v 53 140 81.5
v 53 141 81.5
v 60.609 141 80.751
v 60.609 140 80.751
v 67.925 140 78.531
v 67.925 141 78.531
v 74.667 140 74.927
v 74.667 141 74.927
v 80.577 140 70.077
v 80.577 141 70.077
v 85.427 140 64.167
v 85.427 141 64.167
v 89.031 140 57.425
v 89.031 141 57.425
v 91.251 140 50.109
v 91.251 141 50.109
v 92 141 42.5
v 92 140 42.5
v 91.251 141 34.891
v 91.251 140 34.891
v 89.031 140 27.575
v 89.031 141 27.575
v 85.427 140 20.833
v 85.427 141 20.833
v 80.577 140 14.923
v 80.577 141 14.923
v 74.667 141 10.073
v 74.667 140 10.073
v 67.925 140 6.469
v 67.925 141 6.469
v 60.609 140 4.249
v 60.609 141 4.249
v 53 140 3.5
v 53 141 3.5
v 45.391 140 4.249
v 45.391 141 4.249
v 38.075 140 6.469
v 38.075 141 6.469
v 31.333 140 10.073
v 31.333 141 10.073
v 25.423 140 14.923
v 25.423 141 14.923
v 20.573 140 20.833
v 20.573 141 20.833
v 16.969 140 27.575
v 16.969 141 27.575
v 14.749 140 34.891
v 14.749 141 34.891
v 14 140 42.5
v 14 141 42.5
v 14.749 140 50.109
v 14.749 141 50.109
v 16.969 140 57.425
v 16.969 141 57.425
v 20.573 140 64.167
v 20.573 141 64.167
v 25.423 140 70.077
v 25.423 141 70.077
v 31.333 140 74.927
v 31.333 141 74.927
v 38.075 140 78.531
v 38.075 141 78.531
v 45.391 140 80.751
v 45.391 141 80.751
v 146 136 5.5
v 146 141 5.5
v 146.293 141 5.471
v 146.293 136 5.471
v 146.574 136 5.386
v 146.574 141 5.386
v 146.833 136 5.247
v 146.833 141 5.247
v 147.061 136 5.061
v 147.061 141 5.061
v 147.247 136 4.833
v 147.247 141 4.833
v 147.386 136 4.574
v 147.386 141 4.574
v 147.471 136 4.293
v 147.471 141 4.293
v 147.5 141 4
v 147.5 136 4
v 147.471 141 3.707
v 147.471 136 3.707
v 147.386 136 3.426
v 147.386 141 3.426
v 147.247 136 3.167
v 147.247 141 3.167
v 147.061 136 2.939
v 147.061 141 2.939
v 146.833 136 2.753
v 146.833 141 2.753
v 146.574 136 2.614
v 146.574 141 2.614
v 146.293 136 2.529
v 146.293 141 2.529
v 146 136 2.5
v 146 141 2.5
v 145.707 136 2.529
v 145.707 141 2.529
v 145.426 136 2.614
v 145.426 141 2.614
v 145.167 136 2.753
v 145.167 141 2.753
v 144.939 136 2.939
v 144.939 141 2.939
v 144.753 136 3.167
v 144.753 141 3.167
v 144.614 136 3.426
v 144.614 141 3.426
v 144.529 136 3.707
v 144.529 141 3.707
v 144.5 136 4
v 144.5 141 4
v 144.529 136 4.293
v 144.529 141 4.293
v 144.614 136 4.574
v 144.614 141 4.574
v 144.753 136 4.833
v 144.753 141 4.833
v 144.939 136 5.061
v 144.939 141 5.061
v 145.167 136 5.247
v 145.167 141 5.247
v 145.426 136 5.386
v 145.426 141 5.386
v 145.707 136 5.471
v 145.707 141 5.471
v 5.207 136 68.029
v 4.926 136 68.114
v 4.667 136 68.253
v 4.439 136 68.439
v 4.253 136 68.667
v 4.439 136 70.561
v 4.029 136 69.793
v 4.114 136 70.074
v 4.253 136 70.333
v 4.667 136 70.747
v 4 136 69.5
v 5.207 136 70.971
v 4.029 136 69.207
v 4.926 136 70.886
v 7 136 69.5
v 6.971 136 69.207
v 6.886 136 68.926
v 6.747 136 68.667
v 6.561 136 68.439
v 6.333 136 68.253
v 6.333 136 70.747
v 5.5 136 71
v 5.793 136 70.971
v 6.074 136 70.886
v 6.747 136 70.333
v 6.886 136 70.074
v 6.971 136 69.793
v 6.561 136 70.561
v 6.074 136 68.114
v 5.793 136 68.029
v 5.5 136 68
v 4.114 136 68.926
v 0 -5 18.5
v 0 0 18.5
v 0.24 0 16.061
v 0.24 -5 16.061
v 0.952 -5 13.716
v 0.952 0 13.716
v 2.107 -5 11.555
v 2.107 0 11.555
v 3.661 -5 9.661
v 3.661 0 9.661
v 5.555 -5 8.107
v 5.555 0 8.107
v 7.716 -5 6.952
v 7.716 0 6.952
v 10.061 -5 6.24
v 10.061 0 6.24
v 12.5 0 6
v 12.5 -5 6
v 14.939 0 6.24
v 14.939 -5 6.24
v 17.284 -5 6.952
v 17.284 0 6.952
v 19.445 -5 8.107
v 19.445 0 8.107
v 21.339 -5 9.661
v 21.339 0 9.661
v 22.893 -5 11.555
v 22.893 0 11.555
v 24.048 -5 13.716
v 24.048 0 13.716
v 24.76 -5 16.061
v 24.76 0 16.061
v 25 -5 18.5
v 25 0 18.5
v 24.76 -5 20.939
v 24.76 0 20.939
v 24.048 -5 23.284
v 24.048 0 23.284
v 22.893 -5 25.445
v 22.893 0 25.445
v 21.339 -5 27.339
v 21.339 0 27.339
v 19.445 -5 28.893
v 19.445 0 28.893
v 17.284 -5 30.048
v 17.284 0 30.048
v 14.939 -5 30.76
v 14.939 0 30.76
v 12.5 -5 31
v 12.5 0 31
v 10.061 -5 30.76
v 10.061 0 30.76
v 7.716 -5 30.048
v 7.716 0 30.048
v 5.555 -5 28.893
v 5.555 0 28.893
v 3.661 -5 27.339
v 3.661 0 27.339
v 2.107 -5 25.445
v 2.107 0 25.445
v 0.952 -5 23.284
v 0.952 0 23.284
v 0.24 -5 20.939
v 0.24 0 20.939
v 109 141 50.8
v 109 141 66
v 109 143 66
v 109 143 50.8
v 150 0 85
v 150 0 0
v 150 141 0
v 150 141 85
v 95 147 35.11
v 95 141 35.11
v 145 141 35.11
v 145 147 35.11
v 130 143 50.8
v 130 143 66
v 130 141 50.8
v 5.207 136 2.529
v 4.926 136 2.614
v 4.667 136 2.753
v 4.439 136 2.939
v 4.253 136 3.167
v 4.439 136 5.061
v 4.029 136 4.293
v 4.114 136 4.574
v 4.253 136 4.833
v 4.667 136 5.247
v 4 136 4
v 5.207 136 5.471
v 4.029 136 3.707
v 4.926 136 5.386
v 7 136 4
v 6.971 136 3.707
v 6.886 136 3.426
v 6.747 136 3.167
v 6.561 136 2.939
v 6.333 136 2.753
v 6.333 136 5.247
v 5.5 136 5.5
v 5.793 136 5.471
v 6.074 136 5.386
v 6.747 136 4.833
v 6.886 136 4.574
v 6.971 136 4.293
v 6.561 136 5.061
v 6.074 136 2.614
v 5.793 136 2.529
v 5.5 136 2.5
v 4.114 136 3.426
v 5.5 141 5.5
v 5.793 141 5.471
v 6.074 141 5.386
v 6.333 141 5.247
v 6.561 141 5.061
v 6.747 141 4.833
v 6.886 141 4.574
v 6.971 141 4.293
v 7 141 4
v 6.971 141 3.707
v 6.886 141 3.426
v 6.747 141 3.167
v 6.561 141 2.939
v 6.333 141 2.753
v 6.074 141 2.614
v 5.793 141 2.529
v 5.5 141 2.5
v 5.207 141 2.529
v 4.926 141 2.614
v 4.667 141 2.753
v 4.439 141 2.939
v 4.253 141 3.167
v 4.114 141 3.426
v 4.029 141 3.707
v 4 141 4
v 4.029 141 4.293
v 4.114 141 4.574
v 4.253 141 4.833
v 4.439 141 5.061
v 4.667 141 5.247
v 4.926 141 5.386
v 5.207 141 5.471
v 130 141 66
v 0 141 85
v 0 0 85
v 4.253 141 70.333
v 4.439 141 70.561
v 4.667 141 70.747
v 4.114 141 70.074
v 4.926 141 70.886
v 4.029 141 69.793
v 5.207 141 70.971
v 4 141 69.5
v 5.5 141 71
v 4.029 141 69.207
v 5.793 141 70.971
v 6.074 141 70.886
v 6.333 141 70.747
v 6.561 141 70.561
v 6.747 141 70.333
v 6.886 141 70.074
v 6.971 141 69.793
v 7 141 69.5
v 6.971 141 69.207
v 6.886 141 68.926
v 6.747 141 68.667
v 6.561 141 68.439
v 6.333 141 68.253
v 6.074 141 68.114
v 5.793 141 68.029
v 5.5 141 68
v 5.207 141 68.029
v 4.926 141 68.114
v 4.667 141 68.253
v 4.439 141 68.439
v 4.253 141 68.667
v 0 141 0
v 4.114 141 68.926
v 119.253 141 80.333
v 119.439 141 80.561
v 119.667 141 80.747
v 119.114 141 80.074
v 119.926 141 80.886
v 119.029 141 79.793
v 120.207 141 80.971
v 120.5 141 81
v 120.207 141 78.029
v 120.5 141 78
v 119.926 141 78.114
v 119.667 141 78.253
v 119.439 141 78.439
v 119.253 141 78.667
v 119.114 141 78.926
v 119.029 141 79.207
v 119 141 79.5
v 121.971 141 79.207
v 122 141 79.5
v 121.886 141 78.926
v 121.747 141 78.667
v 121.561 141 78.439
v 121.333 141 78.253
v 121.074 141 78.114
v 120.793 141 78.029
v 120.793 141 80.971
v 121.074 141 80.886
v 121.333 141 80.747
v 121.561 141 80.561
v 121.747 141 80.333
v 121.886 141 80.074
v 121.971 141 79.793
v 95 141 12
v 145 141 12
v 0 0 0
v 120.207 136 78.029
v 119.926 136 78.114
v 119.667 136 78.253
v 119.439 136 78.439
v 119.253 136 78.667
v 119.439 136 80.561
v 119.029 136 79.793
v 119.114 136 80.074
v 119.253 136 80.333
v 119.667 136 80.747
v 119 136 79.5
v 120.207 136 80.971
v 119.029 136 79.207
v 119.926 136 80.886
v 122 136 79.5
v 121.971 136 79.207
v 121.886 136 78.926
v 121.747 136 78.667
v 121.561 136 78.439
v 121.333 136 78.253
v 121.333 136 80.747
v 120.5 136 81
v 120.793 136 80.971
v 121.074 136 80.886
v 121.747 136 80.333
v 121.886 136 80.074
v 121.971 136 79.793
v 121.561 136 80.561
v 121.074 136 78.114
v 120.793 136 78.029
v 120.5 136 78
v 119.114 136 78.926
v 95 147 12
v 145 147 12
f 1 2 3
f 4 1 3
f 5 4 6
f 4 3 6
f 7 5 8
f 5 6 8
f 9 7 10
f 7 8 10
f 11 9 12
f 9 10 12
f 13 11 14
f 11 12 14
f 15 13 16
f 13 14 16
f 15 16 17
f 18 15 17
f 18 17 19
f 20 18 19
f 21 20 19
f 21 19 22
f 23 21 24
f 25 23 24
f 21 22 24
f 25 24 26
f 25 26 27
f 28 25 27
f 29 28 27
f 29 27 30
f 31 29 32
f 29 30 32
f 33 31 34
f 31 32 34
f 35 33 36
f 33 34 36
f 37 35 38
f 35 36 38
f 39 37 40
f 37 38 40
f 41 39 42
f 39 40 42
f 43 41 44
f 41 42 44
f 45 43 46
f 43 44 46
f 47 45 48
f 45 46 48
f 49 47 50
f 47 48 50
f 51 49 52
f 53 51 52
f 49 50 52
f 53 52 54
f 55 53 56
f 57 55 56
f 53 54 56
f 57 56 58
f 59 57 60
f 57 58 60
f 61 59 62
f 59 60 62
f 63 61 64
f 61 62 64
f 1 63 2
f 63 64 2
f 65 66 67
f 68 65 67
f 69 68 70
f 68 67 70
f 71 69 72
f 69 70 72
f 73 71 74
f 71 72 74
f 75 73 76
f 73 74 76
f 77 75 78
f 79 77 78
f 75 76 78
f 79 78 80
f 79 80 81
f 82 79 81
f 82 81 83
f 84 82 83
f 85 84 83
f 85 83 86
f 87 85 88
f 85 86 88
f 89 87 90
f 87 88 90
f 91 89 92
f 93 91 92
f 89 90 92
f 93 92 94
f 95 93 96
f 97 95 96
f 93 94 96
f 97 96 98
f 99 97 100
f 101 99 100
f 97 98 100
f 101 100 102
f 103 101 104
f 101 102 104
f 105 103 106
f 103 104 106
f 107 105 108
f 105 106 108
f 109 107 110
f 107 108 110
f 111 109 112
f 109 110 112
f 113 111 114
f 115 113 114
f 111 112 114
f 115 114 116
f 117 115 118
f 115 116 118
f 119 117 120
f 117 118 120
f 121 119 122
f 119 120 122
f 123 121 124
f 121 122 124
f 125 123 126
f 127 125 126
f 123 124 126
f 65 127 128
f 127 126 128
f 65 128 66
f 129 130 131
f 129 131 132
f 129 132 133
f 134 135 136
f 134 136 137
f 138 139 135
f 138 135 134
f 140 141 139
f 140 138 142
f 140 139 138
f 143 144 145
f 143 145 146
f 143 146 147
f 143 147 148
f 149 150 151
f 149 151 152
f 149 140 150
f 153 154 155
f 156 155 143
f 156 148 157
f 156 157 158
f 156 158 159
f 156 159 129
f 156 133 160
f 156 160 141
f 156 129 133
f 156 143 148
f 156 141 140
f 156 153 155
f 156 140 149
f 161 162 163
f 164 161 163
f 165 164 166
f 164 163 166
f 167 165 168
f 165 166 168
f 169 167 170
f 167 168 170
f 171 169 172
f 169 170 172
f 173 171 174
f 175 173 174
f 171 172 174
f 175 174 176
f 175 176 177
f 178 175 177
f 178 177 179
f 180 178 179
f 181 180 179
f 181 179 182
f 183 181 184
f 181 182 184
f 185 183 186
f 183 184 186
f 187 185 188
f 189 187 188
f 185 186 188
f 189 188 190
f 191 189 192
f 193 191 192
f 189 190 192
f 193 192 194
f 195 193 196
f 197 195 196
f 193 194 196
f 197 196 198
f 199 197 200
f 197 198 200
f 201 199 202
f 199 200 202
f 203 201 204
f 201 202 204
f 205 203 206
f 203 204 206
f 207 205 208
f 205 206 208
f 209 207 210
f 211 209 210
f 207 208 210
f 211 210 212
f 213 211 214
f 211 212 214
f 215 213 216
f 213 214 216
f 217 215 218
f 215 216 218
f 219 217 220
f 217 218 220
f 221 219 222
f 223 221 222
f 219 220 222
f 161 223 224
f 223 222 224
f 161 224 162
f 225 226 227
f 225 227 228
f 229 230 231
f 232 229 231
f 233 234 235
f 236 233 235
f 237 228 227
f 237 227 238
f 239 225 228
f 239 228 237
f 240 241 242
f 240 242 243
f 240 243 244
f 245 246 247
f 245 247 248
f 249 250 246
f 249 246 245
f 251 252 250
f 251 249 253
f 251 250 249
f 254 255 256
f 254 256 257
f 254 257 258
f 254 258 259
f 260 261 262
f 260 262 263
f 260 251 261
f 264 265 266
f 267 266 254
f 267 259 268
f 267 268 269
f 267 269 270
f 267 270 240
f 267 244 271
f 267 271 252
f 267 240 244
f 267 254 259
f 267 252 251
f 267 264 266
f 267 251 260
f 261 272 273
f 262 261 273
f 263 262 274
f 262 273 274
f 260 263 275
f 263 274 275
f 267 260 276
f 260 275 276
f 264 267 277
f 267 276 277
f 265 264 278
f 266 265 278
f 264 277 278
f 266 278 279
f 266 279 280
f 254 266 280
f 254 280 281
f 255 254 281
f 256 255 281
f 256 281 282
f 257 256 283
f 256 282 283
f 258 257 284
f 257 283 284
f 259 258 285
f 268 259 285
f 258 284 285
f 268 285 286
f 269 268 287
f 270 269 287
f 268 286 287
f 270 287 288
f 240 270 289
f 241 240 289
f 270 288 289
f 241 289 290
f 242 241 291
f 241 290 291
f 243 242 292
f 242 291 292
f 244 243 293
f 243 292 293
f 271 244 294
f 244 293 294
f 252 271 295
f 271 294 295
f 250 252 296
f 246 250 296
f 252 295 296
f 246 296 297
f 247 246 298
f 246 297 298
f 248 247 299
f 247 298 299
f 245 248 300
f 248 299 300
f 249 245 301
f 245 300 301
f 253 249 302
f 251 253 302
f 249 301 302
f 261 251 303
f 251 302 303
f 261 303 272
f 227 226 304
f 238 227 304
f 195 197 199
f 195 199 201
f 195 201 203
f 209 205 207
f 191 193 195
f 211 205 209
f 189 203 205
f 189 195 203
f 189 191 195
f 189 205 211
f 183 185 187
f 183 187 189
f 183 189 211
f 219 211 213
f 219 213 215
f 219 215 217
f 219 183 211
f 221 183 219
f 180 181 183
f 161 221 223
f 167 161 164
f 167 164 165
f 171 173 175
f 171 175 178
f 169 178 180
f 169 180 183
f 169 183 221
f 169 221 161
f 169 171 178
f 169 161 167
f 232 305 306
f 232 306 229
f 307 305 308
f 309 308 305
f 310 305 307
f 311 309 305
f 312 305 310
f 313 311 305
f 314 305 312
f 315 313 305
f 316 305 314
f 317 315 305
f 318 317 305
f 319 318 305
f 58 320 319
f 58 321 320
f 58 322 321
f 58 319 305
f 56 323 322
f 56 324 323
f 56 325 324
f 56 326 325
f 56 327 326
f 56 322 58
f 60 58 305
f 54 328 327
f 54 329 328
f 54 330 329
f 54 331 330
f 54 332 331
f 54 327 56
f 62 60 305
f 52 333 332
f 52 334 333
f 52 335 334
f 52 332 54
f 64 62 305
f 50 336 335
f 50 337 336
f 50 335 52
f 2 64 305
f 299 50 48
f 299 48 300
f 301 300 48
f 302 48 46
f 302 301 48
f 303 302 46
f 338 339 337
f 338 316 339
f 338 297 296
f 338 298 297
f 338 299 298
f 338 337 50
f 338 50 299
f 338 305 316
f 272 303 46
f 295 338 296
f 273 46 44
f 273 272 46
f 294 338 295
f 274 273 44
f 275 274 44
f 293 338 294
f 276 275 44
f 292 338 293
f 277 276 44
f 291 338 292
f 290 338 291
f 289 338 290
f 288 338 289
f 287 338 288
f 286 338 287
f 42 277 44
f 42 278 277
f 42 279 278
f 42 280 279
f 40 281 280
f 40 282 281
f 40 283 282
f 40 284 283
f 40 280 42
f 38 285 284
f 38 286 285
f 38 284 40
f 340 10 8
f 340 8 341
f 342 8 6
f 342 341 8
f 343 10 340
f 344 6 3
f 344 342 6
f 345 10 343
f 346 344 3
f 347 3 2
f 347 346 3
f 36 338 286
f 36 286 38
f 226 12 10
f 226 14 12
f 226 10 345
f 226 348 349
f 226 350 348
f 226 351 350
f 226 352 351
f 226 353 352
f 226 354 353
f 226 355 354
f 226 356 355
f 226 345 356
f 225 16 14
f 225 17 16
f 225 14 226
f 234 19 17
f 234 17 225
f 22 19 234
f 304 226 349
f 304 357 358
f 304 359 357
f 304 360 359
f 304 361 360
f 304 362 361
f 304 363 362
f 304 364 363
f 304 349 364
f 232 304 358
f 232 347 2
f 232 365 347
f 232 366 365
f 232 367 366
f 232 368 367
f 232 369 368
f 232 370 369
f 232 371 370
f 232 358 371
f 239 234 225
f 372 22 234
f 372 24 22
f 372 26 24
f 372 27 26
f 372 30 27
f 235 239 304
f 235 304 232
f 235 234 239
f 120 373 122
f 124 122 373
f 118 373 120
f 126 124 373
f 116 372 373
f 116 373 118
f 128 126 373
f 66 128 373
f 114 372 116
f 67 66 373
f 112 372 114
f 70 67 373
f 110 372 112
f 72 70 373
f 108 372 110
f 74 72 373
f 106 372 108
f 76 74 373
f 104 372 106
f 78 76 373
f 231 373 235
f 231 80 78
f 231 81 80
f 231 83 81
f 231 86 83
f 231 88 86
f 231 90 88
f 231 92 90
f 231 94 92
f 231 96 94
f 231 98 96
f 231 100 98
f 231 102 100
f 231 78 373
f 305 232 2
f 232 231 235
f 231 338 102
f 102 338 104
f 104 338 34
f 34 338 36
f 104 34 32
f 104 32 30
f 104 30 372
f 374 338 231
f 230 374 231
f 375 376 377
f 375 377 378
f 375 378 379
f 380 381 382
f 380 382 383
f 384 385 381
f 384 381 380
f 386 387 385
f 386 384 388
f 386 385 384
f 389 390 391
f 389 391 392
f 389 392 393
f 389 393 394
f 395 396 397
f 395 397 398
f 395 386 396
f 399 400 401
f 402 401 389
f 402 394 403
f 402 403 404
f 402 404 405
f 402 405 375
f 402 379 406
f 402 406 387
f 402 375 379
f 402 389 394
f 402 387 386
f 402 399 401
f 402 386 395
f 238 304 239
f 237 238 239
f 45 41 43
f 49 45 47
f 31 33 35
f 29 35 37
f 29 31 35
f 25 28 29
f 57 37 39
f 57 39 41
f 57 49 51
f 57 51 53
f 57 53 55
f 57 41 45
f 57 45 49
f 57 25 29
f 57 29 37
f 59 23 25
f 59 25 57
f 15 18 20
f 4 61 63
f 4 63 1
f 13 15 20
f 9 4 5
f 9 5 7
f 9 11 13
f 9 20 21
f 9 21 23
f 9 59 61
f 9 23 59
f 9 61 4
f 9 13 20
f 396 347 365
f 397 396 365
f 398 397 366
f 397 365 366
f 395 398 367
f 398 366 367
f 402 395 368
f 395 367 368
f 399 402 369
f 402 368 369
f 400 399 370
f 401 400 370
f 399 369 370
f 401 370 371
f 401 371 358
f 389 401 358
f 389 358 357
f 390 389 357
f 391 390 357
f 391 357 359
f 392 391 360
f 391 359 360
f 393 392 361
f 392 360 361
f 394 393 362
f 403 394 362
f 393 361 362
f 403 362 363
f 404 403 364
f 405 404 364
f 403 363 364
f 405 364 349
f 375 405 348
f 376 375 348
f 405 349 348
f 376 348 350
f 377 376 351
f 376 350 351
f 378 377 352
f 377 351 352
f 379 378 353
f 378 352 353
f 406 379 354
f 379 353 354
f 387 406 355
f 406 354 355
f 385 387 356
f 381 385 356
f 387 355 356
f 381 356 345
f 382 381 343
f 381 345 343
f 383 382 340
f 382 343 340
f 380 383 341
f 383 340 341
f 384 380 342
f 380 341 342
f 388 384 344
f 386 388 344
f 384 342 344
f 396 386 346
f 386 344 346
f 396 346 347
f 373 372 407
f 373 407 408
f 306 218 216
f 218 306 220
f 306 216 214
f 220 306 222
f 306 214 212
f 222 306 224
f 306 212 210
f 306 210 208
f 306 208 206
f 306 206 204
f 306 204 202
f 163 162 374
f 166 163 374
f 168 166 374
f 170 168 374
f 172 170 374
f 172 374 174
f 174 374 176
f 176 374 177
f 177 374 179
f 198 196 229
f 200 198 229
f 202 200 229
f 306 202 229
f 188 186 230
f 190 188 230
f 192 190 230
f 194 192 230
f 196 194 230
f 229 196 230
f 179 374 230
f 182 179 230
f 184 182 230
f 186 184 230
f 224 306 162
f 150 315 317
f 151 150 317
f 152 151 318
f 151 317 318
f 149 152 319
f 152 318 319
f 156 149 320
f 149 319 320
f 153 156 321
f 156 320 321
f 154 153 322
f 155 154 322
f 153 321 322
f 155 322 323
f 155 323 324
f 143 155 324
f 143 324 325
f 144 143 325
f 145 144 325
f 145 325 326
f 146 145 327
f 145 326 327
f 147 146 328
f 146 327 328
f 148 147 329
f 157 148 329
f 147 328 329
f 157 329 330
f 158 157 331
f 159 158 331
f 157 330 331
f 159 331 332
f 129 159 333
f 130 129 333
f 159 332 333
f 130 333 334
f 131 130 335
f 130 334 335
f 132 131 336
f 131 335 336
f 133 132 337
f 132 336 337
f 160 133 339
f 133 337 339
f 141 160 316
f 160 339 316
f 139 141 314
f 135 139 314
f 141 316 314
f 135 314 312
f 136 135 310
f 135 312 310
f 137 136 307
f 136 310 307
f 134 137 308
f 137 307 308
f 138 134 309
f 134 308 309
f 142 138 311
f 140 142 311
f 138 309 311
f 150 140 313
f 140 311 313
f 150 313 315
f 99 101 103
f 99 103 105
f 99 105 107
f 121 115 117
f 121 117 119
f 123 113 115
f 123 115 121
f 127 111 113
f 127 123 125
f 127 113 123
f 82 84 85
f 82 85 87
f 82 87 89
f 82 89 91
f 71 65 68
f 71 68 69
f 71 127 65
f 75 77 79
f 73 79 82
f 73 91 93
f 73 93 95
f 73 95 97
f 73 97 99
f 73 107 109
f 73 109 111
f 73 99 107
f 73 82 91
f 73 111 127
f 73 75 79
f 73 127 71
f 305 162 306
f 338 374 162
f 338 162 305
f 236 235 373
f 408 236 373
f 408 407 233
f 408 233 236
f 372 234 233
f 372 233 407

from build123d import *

# Parameters (mm, degrees)
ESQUISSE1_W             = 150
ESQUISSE1_H             = 141
BOSS_EXTRU_1_DEPTH      = 85
ESQUISSE2_W             = 21
ESQUISSE2_H             = 15.2
BOSS_EXTRU_2_DEPTH      = 2
ESQUISSE3_W             = 50
ESQUISSE3_H             = 23.11
BOSS_EXTRU_3_DEPTH      = 6
ESQUISSE4_R             = 39
ENL_V_MAT_EXTRU_1_DEPTH = 1
ESQUISSE5_R             = 1.5
ENL_V_MAT_EXTRU_2_DEPTH = 5
ESQUISSE6_R             = 12.5
BOSS_EXTRU_4_DEPTH      = 5


with BuildPart() as part:
    # Esquisse1 → Boss.-Extru.1 (new body)
    with BuildSketch(Plane.XY):
        with Locations((75, 70.5)):
            Rectangle(ESQUISSE1_W, ESQUISSE1_H)
    extrude(amount=BOSS_EXTRU_1_DEPTH)

    # Esquisse2 → Boss.-Extru.2 (add)
    with BuildSketch(Plane(origin=(0, 141, 0), x_dir=(1, 0, 0), z_dir=(0, 1, 0))):
        with Locations((119.5, -58.4)):
            Rectangle(ESQUISSE2_W, ESQUISSE2_H)
    extrude(amount=BOSS_EXTRU_2_DEPTH)

    # Esquisse3 → Boss.-Extru.3 (add)
    with BuildSketch(Plane(origin=(0, 141, 0), x_dir=(1, 0, 0), z_dir=(0, 1, 0))):
        with Locations((120, -23.555)):
            Rectangle(ESQUISSE3_W, ESQUISSE3_H)
    extrude(amount=BOSS_EXTRU_3_DEPTH)

    # Esquisse4 → Enlèv. mat.-Extru.1 (cut)
    with BuildSketch(Plane(origin=(0, 141, 0), x_dir=(1, 0, 0), z_dir=(0, 1, 0))):
        with Locations(Location((53, -42.5, 0), (0, 0, 270))):
            Circle(ESQUISSE4_R)
    extrude(amount=-ENL_V_MAT_EXTRU_1_DEPTH, mode=Mode.SUBTRACT)

    # Esquisse5 → Enlèv. mat.-Extru.2 (cut)
    with BuildSketch(Plane(origin=(0, 141, 0), x_dir=(1, 0, 0), z_dir=(0, 1, 0))):
        with Locations(Location((120.5, -79.5, 0), (0, 0, 270))):
            Circle(ESQUISSE5_R)
        with Locations(Location((5.5, -69.5, 0), (0, 0, 270))):
            Circle(ESQUISSE5_R)
        with Locations(Location((5.5, -4, 0), (0, 0, 270))):
            Circle(ESQUISSE5_R)
        with Locations(Location((146, -4, 0), (0, 0, 270))):
            Circle(ESQUISSE5_R)
    extrude(amount=-ENL_V_MAT_EXTRU_2_DEPTH, mode=Mode.SUBTRACT)

    # Esquisse6 → Boss.-Extru.4 (add)
    with BuildSketch(Plane(origin=(0, 0, 0), x_dir=(-1, 0, 0), z_dir=(0, -1, 0))):
        with Locations((-12.5, -18.5)):
            Circle(ESQUISSE6_R)
    extrude(amount=BOSS_EXTRU_4_DEPTH)


solid = part.part
